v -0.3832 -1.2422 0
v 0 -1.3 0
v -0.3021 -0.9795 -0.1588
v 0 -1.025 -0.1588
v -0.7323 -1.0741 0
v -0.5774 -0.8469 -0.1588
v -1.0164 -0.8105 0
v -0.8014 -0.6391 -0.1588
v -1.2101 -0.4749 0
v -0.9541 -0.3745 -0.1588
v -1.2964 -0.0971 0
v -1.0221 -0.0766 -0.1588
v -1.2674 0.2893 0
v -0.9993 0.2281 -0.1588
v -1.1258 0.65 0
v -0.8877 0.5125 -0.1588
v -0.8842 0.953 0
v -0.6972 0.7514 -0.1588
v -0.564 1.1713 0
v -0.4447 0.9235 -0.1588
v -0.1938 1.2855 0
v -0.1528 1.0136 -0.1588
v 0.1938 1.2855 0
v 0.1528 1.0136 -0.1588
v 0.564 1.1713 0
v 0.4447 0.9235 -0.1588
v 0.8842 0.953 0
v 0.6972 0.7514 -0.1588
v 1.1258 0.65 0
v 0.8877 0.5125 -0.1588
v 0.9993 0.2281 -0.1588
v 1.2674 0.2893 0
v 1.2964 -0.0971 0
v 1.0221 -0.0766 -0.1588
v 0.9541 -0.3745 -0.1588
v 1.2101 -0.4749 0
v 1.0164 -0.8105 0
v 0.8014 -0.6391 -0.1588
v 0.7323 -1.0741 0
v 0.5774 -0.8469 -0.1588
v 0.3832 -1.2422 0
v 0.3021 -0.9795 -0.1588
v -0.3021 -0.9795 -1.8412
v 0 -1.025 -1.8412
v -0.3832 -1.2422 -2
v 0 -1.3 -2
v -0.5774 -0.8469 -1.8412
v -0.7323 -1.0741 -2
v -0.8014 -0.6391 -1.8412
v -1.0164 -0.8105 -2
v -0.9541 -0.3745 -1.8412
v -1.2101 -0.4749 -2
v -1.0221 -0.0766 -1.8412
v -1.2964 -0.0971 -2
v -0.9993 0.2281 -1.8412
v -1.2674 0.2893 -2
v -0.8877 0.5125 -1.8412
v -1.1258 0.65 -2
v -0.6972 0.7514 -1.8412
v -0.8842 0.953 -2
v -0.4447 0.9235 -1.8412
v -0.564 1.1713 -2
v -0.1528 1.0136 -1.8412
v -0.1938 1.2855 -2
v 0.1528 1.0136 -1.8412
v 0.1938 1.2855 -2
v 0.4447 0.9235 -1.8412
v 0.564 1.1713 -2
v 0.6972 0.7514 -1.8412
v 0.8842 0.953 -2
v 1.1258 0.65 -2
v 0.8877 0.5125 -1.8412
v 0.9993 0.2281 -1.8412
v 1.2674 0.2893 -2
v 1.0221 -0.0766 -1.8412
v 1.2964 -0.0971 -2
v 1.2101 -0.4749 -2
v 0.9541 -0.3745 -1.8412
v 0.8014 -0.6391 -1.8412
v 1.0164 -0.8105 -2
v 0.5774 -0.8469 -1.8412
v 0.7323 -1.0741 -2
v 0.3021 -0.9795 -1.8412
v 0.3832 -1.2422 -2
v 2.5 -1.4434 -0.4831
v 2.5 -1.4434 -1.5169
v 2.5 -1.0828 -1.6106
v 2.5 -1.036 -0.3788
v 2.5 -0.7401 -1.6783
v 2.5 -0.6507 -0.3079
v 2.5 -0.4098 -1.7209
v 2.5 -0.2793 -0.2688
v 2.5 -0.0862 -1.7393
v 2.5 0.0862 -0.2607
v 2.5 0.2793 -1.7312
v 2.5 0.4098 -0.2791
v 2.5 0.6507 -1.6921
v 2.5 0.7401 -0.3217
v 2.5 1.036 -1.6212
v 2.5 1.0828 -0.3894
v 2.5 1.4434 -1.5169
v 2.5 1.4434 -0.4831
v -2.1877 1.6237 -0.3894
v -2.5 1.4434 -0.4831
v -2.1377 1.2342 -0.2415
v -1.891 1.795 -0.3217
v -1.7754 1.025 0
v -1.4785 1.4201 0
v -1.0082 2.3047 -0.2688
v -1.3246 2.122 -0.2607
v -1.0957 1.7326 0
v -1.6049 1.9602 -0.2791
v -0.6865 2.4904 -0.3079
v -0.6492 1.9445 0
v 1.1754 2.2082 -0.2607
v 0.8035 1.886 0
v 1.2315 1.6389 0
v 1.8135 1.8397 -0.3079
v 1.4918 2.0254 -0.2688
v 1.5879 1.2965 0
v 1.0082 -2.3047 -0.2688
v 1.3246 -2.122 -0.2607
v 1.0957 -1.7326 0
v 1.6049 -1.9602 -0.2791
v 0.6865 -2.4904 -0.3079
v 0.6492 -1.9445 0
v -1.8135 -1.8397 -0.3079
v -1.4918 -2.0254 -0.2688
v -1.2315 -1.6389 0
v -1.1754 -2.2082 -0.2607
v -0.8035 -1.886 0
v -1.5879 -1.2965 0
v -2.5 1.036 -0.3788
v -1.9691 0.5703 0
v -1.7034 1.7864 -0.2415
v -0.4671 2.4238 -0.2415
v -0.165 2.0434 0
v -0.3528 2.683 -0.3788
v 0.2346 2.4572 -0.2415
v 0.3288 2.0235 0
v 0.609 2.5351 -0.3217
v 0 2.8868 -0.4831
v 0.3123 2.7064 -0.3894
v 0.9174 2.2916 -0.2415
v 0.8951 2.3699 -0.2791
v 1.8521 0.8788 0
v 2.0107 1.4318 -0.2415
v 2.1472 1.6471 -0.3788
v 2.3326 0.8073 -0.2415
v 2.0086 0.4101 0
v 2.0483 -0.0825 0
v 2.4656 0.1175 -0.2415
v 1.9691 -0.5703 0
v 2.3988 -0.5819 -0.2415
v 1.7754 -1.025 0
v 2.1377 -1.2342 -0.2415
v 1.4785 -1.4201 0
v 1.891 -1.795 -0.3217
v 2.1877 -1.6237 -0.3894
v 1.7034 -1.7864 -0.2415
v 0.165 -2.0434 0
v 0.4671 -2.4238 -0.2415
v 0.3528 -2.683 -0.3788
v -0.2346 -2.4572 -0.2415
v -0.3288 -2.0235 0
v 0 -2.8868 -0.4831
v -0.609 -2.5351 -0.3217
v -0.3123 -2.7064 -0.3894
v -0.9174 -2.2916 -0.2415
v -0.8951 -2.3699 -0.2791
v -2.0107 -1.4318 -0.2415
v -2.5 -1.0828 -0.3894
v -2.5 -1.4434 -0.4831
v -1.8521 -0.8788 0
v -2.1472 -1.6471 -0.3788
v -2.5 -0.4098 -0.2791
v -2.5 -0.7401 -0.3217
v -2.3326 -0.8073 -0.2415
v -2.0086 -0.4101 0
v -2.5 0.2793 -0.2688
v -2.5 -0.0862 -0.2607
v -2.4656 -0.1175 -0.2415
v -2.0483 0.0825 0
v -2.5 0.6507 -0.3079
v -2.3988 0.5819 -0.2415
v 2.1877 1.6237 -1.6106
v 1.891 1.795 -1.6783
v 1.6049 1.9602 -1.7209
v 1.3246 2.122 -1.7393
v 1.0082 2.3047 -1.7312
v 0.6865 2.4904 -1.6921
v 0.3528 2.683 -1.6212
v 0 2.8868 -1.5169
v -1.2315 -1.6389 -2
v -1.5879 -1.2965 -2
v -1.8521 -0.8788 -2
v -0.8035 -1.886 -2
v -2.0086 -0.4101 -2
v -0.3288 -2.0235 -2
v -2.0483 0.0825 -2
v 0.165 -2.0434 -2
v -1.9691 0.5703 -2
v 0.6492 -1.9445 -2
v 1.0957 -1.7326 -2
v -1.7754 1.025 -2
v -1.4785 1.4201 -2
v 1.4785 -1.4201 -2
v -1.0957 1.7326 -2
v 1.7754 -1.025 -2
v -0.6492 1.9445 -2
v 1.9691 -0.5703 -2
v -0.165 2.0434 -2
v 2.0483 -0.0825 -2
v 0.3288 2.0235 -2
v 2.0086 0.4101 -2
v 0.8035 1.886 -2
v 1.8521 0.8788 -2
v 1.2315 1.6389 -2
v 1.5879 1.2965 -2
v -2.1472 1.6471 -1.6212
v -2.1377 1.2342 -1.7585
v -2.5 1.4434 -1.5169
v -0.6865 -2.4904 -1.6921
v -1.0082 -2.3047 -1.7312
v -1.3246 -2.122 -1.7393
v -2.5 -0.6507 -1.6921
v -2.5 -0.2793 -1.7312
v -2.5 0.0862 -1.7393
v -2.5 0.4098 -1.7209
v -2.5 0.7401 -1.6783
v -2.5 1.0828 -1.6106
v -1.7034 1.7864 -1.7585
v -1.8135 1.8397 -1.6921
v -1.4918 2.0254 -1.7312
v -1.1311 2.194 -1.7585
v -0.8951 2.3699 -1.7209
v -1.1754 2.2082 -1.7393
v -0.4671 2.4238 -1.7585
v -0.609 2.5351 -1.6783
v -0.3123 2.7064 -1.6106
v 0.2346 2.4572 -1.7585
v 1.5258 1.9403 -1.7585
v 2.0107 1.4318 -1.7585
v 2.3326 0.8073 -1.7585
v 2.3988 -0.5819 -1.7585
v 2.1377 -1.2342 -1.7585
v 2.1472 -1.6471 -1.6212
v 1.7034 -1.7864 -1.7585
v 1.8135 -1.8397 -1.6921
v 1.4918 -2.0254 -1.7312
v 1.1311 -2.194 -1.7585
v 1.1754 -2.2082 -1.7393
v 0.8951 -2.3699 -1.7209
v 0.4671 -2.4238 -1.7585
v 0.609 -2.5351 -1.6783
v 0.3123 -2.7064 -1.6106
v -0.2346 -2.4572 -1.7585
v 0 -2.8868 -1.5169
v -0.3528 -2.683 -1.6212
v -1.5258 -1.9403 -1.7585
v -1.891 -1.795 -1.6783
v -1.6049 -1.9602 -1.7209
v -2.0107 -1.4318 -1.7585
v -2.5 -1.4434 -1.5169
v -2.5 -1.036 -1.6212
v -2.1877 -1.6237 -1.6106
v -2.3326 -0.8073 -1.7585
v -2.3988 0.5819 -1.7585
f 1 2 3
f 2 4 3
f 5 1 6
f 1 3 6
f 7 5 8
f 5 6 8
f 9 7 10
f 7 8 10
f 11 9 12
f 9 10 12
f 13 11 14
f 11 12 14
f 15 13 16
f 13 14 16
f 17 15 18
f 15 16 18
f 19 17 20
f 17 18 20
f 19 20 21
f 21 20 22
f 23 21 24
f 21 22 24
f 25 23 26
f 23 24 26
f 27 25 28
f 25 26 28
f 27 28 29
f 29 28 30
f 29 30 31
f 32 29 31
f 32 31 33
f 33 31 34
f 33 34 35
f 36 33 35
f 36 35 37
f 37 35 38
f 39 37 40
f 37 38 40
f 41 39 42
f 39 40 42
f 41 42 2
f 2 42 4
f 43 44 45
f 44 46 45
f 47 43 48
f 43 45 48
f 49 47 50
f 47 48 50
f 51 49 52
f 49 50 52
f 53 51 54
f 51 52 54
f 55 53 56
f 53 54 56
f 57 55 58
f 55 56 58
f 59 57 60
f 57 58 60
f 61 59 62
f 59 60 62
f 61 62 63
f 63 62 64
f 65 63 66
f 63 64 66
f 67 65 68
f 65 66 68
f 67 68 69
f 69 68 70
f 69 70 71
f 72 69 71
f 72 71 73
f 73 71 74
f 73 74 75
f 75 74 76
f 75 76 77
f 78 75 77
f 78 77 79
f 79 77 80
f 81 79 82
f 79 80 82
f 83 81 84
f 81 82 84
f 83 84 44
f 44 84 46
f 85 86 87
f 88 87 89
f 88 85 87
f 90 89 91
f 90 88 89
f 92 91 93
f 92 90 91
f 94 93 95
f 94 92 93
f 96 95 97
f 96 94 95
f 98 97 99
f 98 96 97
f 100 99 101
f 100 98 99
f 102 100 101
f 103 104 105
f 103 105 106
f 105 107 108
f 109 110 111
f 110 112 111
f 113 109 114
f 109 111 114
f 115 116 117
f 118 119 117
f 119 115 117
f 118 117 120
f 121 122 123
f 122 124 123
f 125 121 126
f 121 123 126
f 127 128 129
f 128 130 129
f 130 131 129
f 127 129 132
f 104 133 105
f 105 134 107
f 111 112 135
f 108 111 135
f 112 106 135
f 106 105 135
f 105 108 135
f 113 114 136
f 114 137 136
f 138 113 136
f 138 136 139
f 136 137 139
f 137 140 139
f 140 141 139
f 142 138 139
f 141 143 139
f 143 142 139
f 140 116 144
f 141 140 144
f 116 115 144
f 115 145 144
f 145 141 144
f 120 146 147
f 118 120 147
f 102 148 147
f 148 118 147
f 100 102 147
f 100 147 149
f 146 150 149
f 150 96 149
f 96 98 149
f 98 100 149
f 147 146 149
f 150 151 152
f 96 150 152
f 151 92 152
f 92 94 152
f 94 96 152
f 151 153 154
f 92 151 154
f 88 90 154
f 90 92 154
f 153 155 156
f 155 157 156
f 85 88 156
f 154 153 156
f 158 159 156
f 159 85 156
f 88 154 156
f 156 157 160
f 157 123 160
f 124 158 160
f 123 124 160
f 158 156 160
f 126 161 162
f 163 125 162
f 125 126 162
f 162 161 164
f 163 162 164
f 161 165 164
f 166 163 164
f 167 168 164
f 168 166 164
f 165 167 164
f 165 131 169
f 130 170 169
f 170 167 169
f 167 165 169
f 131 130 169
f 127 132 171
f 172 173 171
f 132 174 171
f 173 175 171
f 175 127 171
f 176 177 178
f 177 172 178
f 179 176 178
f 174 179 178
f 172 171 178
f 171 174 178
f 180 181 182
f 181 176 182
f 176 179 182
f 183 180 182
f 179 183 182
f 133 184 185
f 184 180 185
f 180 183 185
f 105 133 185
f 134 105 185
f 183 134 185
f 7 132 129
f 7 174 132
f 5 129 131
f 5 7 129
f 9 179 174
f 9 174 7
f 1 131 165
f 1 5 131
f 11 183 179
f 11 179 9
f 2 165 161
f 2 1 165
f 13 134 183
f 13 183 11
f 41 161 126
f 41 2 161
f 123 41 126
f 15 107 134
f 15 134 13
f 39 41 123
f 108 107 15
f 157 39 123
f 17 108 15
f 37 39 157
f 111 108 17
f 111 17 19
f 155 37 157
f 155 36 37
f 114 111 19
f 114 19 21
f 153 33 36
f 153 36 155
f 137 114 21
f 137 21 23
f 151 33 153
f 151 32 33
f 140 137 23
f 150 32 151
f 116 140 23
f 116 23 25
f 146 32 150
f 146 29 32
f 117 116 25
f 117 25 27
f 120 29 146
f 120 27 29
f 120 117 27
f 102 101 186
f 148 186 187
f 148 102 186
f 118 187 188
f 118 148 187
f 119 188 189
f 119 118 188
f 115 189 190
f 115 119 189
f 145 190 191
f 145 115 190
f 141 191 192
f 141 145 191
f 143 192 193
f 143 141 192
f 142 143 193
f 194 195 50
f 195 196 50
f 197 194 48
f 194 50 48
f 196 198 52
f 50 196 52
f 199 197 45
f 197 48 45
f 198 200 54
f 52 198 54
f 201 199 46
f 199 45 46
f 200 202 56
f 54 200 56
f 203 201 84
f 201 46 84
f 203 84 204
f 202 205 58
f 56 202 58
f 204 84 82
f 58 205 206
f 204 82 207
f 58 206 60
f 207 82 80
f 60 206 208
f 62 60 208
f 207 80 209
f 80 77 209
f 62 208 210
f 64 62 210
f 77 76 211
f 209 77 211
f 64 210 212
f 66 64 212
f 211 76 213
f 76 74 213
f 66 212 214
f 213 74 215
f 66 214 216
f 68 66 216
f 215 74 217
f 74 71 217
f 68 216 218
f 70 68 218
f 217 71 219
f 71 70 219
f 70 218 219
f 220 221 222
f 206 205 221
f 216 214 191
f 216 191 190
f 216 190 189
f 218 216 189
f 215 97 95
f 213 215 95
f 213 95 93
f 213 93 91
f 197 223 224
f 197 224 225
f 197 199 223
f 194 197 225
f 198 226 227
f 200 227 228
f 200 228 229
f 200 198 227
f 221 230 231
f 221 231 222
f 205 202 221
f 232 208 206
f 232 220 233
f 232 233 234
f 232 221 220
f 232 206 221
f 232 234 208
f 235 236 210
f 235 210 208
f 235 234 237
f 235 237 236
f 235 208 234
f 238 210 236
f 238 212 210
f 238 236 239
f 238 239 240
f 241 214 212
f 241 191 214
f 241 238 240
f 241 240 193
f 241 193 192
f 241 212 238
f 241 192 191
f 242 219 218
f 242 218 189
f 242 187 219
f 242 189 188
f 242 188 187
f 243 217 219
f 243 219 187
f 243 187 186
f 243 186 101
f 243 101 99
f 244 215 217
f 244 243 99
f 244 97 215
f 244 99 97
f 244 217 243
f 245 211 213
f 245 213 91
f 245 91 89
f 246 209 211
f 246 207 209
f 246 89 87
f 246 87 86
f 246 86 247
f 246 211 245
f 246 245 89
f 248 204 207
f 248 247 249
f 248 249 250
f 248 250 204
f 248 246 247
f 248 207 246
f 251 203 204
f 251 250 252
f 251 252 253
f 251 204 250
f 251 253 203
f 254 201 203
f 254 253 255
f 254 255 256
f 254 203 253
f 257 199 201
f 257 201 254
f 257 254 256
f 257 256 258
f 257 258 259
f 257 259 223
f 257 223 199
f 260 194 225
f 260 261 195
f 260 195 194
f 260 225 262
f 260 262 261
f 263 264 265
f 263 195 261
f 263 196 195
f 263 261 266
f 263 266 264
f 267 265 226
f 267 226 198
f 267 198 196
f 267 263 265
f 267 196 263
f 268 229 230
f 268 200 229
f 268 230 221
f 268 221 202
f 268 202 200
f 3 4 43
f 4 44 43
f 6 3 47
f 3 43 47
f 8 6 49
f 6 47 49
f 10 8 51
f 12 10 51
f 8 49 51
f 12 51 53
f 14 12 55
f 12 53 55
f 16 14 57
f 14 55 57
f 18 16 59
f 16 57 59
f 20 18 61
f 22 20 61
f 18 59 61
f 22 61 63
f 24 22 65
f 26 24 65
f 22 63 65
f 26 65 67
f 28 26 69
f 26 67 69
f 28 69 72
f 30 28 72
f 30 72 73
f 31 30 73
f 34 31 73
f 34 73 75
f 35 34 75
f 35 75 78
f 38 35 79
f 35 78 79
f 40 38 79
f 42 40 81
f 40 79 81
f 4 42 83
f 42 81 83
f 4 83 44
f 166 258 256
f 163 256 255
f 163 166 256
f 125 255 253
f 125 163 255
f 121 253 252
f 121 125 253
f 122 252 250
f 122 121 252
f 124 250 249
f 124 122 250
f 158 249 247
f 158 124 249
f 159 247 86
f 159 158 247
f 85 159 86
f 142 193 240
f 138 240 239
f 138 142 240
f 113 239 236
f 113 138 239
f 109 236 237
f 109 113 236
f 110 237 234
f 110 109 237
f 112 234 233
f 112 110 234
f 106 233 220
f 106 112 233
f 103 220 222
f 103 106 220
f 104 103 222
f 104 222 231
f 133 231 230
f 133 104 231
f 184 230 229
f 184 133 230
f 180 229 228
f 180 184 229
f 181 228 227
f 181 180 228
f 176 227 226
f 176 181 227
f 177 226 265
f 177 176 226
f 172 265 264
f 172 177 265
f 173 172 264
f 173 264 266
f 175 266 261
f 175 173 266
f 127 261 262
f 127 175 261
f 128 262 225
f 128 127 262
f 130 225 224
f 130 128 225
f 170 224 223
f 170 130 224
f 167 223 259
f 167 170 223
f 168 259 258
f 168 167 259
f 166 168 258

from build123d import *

# Parameters (mm, degrees)
BOSS_EXTRUDE1_DEPTH = 2


with BuildPart() as part:
    # Sketch1 → Boss-Extrude1 (new body)
    with BuildSketch(Plane.XY):
        Polygon((0, 2.886751346), (-2.5, 1.443375673), (-2.5, -1.443375673), (0, -2.886751346), (2.5, -1.443375673), (2.5, 1.443375673), align=None)
    extrude(amount=-BOSS_EXTRUDE1_DEPTH)

    # Sketch4 → Cut-Revolve1 (revolve, cut)
    with BuildSketch(Plane(origin=(0, 0, 0), x_dir=(0, 0, -1), z_dir=(1, 0, 0)), mode=Mode.PRIVATE) as cut_revolve1_sk:
        Polygon((2, 2.886751346), (1.516901385, 2.886751346), (2, 2.05), align=None)
        Polygon((0, 2.886751346), (0.483098615, 2.886751346), (0, 2.05), align=None)
    revolve(cut_revolve1_sk.sketch.rotate(Axis((0, 0, 0), (0, 0, -1)), 299.999999912), axis=Axis((0, 0, 0), (0, 0, -1)), mode=Mode.SUBTRACT)

    # Sketch5 → Cut-Revolve2 (revolve, cut)
    with BuildSketch(Plane(origin=(0, 0, 0), x_dir=(0, 0, -1), z_dir=(1, 0, 0)), mode=Mode.PRIVATE) as cut_revolve2_sk:
        Polygon((0, 0), (0, 1.3), (0.158771324, 1.025), (1.841228676, 1.025), (2, 1.3), (2, 0), align=None)
    revolve(cut_revolve2_sk.sketch.rotate(Axis((0, 0, 0), (0, 0, -1)), 180), axis=Axis((0, 0, 0), (0, 0, -1)), mode=Mode.SUBTRACT)


solid = part.part
